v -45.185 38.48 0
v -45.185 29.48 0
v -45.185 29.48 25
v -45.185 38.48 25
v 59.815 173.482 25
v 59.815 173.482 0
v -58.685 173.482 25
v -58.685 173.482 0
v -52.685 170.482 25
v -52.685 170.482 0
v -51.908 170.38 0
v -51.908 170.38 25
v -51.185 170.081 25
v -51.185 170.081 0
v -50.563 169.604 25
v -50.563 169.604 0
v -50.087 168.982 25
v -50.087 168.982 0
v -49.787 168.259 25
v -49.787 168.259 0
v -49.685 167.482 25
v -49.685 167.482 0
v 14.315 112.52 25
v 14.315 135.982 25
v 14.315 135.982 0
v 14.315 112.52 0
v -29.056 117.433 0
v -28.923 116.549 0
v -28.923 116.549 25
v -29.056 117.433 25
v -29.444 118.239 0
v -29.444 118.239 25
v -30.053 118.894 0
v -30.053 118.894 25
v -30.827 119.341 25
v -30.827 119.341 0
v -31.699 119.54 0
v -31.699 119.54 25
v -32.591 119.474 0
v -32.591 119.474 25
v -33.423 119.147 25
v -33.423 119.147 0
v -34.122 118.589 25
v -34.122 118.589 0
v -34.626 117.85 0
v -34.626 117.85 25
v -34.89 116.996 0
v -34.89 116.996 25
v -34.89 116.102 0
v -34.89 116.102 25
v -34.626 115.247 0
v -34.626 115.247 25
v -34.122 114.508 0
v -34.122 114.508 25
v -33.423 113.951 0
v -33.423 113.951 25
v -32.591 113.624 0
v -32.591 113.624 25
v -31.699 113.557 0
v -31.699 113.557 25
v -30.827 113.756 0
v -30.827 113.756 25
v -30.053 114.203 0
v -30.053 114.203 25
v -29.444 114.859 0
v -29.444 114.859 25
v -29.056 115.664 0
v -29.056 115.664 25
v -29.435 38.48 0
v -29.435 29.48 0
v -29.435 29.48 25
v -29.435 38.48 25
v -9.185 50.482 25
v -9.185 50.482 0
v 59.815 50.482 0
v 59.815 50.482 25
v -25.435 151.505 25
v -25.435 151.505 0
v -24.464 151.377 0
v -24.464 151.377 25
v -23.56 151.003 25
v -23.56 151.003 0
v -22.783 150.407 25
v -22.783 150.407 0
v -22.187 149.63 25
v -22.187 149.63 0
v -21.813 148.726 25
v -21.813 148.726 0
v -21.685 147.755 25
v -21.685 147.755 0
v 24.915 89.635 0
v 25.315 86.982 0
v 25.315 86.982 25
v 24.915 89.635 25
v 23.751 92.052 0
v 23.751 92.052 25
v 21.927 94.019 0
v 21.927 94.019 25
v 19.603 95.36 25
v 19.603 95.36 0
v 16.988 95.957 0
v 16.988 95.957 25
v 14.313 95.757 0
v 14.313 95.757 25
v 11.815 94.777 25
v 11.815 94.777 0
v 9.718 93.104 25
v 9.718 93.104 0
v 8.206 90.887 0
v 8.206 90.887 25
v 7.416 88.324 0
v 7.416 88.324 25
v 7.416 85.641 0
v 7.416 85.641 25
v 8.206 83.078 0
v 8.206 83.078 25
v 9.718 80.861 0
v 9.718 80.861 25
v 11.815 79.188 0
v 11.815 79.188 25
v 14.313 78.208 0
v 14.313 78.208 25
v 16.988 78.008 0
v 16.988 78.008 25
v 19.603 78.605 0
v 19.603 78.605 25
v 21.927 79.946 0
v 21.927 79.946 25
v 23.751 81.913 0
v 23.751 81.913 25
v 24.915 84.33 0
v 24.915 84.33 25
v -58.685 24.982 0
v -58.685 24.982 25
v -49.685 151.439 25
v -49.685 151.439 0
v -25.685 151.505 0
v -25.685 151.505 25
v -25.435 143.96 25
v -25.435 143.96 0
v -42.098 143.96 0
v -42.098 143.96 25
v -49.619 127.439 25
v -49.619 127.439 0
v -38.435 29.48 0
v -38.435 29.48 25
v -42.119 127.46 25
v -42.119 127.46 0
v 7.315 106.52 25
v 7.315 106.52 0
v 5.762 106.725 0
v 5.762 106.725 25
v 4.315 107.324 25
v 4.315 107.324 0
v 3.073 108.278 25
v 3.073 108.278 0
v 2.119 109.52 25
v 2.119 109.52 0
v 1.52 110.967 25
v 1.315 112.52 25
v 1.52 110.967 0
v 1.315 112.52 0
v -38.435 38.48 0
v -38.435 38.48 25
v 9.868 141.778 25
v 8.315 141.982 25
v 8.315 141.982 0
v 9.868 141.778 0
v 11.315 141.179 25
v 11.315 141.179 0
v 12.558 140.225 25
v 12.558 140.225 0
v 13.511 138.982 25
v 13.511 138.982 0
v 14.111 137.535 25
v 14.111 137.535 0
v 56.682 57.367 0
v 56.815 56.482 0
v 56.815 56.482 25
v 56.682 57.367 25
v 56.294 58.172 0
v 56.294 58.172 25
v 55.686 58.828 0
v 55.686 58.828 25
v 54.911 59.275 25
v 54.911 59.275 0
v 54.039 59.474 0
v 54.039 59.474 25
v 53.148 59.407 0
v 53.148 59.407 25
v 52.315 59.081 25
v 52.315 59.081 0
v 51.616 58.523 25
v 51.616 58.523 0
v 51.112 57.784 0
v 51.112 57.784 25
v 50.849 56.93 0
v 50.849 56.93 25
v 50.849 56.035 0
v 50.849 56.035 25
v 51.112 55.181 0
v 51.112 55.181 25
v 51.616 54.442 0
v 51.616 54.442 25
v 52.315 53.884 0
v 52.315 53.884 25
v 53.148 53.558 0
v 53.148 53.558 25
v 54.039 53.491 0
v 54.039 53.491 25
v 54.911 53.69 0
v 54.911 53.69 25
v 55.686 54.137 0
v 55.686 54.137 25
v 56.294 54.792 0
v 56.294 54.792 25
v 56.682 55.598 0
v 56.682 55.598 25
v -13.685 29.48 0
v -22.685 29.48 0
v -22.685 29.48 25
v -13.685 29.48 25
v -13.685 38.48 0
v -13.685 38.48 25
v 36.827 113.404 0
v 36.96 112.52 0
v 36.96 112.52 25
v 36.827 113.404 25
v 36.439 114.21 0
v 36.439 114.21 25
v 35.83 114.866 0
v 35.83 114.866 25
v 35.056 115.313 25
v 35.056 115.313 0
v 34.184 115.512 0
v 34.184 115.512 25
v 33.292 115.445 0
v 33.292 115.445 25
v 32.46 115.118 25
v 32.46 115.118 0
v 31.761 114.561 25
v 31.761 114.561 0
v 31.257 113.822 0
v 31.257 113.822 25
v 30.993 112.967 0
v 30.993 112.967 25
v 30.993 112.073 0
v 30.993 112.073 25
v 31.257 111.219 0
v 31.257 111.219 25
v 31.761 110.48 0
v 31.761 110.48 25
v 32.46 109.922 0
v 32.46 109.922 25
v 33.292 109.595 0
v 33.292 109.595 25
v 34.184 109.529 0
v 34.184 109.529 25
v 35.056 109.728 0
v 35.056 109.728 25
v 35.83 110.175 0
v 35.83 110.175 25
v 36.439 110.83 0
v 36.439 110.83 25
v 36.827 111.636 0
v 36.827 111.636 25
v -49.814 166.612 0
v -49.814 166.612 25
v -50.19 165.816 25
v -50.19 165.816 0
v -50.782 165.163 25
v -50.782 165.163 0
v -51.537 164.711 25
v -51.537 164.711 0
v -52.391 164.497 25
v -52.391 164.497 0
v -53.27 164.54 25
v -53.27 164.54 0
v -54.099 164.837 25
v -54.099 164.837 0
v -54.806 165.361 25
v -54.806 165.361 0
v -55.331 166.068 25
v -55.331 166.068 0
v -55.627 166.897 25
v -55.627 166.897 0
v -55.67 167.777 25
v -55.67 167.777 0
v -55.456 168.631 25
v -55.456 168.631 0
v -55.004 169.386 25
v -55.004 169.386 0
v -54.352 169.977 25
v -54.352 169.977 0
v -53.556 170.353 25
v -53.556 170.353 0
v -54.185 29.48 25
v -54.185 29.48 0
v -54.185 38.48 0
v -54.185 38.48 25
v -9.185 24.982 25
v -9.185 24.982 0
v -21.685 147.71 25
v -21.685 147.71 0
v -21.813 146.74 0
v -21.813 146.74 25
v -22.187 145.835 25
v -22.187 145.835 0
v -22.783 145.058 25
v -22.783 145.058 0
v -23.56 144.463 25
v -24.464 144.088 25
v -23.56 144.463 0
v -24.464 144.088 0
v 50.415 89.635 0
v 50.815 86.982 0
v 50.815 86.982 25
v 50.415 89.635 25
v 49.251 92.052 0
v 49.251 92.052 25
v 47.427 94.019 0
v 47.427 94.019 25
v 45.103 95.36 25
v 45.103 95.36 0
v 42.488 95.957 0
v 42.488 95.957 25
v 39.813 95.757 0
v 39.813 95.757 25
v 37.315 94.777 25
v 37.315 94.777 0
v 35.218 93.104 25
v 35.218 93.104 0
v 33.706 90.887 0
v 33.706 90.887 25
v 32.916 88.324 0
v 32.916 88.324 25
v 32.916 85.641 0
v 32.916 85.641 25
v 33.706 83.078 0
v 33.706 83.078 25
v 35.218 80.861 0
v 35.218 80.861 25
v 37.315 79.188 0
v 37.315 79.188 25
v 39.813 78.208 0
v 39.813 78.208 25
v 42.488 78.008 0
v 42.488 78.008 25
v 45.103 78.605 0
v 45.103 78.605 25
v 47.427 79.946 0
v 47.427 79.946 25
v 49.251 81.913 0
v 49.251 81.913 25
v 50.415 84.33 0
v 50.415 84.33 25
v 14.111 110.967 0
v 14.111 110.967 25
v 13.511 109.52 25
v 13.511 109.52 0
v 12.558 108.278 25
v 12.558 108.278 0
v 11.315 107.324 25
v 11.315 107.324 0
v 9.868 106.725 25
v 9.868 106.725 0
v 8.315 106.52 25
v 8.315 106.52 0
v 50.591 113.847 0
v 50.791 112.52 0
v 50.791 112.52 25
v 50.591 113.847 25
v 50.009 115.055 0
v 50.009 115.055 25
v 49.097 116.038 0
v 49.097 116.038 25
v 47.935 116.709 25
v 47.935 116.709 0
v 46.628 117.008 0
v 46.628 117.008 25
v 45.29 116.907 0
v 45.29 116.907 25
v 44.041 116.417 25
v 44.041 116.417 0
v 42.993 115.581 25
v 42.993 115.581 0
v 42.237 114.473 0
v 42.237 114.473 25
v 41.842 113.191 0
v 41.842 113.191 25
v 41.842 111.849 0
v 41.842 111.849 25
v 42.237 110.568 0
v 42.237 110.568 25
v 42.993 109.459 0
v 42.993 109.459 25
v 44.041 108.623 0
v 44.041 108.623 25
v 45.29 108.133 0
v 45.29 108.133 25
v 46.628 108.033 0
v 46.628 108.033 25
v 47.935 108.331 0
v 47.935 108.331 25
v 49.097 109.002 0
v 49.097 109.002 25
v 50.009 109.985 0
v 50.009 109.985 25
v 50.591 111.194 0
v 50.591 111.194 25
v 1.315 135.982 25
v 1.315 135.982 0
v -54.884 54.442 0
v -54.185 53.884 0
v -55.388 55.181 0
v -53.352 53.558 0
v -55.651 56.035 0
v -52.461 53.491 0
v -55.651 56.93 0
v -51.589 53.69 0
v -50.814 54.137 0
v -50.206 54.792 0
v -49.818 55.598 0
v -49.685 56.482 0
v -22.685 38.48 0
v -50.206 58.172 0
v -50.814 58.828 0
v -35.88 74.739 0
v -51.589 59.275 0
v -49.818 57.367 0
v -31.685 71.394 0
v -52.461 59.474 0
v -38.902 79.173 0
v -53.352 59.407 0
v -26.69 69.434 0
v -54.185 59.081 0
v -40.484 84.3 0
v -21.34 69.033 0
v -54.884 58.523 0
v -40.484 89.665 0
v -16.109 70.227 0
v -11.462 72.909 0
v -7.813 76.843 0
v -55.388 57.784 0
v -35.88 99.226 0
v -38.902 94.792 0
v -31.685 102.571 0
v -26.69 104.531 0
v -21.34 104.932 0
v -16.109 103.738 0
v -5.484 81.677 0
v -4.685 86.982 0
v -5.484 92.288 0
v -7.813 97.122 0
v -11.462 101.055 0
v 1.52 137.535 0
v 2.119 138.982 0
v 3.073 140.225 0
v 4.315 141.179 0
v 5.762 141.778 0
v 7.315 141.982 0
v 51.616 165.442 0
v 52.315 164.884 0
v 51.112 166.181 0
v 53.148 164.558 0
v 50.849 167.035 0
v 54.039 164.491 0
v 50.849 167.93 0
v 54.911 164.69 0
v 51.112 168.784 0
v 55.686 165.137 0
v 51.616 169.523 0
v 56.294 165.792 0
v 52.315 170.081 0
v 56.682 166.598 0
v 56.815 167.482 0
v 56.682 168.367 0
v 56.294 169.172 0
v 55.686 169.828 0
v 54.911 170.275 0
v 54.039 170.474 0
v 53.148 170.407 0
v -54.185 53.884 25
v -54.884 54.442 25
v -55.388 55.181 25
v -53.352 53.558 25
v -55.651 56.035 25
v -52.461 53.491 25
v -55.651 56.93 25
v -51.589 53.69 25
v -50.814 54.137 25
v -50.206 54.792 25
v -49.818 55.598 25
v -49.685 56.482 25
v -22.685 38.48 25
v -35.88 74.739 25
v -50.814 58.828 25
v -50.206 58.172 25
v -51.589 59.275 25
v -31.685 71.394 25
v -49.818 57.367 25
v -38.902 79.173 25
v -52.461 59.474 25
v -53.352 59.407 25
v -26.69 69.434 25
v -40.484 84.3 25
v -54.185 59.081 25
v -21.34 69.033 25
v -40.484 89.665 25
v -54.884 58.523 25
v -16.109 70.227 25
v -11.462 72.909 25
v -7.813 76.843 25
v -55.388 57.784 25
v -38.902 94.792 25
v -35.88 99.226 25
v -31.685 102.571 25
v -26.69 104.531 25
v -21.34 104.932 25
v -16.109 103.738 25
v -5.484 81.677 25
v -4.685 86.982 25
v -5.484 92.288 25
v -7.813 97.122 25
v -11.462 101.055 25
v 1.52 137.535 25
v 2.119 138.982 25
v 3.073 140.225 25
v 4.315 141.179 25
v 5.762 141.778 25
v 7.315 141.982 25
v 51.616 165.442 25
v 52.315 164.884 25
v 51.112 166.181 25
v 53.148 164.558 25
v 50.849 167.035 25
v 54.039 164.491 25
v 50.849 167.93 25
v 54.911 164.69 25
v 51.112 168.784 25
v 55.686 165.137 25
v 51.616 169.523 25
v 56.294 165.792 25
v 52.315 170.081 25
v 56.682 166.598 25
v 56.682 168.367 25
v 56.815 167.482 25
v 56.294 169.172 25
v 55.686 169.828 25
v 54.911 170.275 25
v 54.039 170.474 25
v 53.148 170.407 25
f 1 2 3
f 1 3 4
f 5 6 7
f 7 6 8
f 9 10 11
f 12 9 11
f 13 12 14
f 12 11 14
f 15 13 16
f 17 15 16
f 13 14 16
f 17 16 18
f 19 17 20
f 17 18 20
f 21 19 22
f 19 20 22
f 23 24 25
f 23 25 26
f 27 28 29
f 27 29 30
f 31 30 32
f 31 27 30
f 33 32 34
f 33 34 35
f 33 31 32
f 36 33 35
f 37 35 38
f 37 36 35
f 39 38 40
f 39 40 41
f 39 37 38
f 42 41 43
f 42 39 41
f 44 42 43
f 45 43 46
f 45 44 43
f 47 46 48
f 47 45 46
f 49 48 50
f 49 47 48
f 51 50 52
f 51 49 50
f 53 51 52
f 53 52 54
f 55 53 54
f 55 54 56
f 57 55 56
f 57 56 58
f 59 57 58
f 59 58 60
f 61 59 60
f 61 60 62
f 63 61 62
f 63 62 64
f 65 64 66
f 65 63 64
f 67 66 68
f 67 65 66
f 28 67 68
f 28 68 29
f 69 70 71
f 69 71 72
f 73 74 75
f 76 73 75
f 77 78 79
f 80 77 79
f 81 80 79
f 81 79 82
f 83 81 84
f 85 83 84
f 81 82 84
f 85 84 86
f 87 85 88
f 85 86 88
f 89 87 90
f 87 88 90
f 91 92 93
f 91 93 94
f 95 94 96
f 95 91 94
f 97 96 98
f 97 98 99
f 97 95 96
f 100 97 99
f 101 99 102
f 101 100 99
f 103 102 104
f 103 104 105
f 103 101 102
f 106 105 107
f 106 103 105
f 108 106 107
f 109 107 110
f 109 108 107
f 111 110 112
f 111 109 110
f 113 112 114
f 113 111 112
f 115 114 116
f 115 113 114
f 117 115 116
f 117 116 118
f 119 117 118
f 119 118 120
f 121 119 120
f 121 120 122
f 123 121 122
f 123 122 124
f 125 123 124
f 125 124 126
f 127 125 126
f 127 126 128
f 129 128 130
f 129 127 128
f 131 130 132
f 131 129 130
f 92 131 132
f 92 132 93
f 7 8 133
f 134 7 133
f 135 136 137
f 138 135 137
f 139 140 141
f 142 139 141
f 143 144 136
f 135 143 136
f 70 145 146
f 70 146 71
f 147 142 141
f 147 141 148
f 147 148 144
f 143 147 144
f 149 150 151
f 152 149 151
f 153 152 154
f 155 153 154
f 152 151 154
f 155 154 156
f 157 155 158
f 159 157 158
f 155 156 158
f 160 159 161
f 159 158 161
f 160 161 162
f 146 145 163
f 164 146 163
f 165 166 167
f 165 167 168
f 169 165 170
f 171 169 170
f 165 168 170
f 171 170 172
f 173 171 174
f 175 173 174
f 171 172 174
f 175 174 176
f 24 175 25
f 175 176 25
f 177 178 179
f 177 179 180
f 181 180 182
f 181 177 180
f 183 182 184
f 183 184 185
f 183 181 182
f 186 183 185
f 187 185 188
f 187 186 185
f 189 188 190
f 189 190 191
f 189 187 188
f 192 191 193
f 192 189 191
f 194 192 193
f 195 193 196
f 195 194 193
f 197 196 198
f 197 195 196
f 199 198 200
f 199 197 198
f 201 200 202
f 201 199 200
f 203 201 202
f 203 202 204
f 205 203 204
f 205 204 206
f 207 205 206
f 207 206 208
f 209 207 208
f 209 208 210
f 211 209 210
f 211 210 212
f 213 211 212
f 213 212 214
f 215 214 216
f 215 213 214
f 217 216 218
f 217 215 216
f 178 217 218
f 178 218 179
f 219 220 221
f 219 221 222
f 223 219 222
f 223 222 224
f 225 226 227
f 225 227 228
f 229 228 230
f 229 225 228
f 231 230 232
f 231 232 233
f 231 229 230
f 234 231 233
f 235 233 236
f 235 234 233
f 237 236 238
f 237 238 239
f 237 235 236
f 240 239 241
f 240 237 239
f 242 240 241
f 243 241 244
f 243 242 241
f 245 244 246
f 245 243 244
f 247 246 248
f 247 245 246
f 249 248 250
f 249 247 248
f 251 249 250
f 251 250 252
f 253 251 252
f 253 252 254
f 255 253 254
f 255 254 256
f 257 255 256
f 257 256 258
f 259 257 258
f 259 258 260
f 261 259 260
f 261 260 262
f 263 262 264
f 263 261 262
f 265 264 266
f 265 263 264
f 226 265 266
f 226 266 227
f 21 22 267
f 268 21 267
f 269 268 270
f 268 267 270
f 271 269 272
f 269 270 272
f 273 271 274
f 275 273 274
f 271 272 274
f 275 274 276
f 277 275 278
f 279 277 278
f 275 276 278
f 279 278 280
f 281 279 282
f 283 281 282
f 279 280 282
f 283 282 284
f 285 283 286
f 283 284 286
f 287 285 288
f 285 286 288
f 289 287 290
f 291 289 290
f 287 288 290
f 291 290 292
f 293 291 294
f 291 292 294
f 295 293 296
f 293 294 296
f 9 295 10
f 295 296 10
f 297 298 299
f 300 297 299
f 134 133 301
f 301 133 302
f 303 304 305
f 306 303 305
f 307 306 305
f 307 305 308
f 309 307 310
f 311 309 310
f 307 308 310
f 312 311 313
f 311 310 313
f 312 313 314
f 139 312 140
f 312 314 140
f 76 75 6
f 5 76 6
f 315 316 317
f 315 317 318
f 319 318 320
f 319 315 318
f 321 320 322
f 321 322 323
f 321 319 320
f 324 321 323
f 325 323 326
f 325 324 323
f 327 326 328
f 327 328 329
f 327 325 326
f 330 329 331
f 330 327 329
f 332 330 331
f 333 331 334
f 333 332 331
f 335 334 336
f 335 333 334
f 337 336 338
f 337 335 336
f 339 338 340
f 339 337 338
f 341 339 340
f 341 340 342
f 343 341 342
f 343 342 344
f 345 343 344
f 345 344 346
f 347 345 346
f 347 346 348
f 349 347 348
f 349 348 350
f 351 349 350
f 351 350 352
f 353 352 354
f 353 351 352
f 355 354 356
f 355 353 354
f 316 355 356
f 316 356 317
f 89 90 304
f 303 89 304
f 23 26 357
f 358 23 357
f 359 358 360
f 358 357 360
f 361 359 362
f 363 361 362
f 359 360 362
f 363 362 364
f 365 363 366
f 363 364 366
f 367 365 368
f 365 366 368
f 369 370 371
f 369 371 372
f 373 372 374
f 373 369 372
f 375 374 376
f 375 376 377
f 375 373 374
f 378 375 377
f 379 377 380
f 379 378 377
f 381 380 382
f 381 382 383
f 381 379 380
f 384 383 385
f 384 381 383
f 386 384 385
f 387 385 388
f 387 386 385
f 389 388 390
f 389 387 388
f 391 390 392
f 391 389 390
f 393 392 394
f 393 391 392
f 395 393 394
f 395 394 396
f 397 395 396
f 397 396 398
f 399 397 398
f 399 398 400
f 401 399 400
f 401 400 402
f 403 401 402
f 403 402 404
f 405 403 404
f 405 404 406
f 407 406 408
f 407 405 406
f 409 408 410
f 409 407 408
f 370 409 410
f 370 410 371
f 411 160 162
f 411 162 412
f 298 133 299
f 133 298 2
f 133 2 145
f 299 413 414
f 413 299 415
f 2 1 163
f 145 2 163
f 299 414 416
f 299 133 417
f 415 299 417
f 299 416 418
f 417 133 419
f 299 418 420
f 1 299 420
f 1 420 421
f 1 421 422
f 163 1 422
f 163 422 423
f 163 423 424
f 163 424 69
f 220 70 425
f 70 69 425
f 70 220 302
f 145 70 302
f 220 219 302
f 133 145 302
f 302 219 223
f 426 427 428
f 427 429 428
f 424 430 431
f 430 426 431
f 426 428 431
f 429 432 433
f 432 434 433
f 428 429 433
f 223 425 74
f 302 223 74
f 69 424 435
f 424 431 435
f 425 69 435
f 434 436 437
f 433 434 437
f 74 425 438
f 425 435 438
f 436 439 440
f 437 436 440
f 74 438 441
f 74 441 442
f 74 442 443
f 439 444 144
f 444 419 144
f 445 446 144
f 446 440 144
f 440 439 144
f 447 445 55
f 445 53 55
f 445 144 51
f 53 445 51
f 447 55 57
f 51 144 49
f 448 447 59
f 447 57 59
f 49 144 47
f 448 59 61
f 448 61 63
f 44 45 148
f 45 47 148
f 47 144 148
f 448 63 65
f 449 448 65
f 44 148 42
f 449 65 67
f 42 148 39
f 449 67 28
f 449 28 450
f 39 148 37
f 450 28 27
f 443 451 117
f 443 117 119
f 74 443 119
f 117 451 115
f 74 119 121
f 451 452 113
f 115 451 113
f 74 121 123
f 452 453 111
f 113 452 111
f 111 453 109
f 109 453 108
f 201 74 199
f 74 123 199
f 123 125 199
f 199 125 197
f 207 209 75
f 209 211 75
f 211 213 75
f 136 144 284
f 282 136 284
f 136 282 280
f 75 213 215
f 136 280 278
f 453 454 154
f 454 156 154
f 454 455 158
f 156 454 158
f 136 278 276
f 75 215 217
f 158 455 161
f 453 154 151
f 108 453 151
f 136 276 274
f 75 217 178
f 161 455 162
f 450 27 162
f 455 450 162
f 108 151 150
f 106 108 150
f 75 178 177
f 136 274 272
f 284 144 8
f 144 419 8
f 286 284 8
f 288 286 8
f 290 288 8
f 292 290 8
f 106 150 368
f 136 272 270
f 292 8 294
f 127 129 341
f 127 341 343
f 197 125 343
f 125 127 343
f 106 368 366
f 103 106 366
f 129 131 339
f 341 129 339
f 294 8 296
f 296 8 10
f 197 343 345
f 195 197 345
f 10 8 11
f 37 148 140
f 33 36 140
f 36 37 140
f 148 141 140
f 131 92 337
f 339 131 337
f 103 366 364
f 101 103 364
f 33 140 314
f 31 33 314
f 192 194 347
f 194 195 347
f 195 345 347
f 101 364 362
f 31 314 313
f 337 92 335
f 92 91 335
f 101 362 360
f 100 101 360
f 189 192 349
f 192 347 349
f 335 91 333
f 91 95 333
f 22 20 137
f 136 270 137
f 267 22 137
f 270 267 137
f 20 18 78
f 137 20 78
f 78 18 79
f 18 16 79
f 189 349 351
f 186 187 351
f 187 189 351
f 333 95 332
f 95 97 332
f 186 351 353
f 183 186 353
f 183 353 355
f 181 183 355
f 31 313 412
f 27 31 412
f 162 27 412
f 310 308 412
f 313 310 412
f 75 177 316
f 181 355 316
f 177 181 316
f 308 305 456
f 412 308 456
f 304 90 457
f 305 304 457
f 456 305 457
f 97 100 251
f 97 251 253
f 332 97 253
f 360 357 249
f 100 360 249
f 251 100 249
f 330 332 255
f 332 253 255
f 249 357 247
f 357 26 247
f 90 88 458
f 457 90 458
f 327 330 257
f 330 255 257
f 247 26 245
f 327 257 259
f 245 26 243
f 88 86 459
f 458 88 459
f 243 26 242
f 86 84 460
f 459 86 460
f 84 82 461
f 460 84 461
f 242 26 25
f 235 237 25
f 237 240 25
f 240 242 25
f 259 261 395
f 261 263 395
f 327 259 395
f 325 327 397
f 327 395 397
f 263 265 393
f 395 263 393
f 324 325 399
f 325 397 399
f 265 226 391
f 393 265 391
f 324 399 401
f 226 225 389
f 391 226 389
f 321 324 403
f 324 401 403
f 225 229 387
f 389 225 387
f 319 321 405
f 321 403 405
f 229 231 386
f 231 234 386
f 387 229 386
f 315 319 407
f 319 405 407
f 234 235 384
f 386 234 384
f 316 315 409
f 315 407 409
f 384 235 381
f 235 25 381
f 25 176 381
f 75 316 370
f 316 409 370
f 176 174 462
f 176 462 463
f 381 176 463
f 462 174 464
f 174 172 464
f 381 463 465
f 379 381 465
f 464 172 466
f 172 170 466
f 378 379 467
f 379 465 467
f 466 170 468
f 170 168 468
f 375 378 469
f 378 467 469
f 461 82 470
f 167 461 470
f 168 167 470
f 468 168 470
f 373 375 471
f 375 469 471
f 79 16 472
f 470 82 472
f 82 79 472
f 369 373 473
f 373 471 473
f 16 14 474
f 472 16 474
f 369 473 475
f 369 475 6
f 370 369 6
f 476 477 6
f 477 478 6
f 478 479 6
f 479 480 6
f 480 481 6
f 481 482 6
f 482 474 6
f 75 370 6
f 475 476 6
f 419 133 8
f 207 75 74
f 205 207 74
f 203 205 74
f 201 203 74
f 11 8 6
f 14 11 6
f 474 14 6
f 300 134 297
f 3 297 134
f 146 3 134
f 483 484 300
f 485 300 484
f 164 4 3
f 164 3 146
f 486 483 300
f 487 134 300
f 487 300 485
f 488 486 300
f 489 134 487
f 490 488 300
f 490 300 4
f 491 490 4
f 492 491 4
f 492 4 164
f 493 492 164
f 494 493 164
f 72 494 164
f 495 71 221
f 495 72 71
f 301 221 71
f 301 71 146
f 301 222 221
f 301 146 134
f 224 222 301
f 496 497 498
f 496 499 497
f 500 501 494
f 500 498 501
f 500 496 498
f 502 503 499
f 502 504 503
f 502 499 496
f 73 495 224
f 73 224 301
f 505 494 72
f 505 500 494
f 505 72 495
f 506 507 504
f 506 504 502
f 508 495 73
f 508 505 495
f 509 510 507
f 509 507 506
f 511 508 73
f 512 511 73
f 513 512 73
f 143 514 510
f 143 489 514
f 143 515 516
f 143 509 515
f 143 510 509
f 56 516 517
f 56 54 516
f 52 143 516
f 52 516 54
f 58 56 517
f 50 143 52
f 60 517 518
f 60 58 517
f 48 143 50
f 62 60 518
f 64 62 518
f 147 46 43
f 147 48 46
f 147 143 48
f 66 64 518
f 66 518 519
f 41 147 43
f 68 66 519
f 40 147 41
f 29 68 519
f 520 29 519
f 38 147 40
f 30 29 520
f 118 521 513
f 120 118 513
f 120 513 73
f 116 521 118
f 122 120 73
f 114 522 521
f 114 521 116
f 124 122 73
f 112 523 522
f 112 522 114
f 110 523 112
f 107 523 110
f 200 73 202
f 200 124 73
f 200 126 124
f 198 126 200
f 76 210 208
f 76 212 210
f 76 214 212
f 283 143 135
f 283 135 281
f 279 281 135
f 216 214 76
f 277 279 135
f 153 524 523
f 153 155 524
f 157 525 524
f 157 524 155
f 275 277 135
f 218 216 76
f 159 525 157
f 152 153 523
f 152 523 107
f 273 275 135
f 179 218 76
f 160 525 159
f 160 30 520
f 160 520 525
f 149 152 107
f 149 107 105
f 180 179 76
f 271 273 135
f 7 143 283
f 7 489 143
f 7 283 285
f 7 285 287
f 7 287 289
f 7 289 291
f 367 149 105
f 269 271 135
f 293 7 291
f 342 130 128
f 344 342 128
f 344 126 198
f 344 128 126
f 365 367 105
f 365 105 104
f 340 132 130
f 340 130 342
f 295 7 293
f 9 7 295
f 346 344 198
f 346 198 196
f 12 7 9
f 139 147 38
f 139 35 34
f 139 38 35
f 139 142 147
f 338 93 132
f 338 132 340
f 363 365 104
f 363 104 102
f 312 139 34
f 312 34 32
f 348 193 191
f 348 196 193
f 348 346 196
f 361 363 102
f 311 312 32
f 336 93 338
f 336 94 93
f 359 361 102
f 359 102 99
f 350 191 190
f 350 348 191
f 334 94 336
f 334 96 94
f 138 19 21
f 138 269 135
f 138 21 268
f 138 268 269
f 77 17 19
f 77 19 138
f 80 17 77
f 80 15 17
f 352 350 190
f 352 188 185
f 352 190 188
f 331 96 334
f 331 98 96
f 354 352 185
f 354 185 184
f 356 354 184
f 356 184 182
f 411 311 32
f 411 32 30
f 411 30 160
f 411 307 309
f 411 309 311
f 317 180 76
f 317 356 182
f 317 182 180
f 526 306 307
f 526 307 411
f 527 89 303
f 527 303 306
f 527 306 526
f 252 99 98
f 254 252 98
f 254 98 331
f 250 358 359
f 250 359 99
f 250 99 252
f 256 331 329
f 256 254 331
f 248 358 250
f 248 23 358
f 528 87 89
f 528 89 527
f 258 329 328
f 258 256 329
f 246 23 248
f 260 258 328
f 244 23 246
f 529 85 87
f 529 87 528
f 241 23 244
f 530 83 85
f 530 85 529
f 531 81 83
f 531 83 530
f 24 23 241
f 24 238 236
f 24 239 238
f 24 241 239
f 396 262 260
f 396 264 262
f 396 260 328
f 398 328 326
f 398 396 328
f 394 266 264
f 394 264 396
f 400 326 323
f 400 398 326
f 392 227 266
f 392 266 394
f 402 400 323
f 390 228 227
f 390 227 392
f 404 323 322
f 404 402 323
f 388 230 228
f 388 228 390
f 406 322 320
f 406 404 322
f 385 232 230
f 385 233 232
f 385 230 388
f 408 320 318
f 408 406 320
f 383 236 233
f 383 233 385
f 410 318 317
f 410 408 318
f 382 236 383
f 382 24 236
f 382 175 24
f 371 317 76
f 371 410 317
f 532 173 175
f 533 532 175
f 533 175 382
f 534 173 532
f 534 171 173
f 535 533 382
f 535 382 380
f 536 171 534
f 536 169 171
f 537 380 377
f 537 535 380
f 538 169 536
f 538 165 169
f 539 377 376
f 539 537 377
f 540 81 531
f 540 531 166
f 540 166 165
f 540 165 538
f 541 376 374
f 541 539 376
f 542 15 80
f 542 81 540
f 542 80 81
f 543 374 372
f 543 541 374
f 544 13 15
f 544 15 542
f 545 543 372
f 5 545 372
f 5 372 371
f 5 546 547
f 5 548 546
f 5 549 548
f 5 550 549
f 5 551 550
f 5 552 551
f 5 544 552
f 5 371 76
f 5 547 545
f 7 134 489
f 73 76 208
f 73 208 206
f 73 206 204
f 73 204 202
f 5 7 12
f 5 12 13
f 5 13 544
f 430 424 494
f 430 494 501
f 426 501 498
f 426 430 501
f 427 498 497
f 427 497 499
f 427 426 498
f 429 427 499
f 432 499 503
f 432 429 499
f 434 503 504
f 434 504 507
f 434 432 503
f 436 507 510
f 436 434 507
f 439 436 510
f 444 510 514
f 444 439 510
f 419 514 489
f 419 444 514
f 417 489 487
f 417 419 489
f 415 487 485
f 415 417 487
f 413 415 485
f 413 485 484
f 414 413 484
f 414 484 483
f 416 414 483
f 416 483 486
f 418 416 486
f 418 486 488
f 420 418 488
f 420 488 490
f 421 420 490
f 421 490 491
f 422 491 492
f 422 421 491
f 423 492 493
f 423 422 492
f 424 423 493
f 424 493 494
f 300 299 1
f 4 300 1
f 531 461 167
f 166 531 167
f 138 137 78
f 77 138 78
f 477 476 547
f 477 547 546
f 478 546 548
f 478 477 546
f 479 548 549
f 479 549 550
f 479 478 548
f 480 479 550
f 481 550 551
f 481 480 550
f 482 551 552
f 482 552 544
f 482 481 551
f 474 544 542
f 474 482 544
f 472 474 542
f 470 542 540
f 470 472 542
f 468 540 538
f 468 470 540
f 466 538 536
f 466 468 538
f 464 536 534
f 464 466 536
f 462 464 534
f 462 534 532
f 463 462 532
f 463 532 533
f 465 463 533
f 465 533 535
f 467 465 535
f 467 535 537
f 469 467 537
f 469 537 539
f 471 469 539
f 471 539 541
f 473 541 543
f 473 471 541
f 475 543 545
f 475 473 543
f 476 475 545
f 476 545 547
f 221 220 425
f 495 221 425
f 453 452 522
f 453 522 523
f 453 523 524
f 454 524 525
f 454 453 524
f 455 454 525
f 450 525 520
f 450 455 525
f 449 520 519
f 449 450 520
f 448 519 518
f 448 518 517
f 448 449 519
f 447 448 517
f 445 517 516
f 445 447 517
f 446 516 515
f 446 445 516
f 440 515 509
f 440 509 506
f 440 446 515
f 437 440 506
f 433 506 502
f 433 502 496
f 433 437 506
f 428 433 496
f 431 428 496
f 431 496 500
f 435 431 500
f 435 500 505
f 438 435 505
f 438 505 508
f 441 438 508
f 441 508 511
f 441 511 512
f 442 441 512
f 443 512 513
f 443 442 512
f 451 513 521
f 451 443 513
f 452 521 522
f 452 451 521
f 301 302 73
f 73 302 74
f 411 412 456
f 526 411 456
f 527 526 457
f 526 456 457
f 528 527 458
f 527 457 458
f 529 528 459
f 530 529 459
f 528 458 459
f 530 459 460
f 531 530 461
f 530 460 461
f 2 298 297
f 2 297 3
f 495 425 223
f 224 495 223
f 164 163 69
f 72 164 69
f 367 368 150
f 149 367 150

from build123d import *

# Parameters (mm, degrees)
F0_W     = 9
F0_H     = 9
F0_R     = 3
F0_R_2   = 18
F0_R_3   = 9
F0_R_4   = 4.5
F1_DEPTH = 25


with BuildPart() as f1:
    # F0 (on Top) → F1 (new body)
    with BuildSketch(Plane.XY):
        Polygon((-52.684808, 173.482456), (-58.684808, 173.482456), (-58.684808, 24.982456), (-9.184808, 24.982456), (-9.184808, 50.482456), (59.815192, 50.482456), (59.815192, 86.982456), (59.815192, 173.482456), (7.315192, 173.482456), align=None)
        with Locations((-49.684808, 33.980483)):
            Rectangle(F0_W, F0_H, mode=Mode.SUBTRACT)
        with Locations((-33.934808, 33.980483)):
            Rectangle(F0_W, F0_H, mode=Mode.SUBTRACT)
        with Locations((-52.684808, 56.482456)):
            Circle(F0_R, mode=Mode.SUBTRACT)
        with Locations((-18.184808, 33.980483)):
            Rectangle(F0_W, F0_H, mode=Mode.SUBTRACT)
        with Locations((-22.684808, 86.982456)):
            Circle(F0_R_2, mode=Mode.SUBTRACT)
        with Locations((53.815192, 56.482456)):
            Circle(F0_R, mode=Mode.SUBTRACT)
        with Locations((16.315192, 86.982456)):
            Circle(F0_R_3, mode=Mode.SUBTRACT)
        with Locations((41.815192, 86.982456)):
            Circle(F0_R_3, mode=Mode.SUBTRACT)
        with Locations((-31.923011, 116.548747)):
            Circle(F0_R, mode=Mode.SUBTRACT)
        with BuildLine():
            Line((-49.618921, 127.439418), (-49.684808, 151.439328))
            Line((-49.684808, 151.439328), (-25.684899, 151.505215))
            Line((-25.684899, 151.505215), (-25.434899, 151.505215))
            ThreePointArc((-25.434899, 151.505215), (-22.783248, 150.406866), (-21.684899, 147.755215))
            Line((-21.684899, 147.755215), (-21.684899, 147.710127))
            ThreePointArc((-21.684899, 147.710127), (-22.783248, 145.058476), (-25.434899, 143.960127))
            Line((-25.434899, 143.960127), (-25.684899, 143.960127))
            Line((-25.684899, 143.960127), (-42.098359, 143.960127))
            Line((-42.098359, 143.960127), (-42.118949, 127.460008))
            Line((-42.118949, 127.460008), (-49.618921, 127.439418))
        make_face(mode=Mode.SUBTRACT)
        with BuildLine():
            ThreePointArc((-49.684808, 167.482456), (-54.806129, 165.361135), (-52.684808, 170.482456))
            ThreePointArc((-52.684808, 170.482456), (-50.563488, 169.603776), (-49.684808, 167.482456))
        make_face(mode=Mode.SUBTRACT)
        with BuildLine():
            Line((1.315192, 114.520175), (1.315192, 133.982456))
            Line((1.315192, 133.982456), (1.315192, 135.982456))
            ThreePointArc((1.315192, 135.982456), (3.072551, 140.225096), (7.315192, 141.982456))
            Line((7.315192, 141.982456), (8.315192, 141.982456))
            ThreePointArc((8.315192, 141.982456), (12.557832, 140.225096), (14.315192, 135.982456))
            Line((14.315192, 135.982456), (14.315192, 132.982456))
            Line((14.315192, 132.982456), (14.315192, 112.520175))
            ThreePointArc((14.315192, 112.520175), (12.557832, 108.277534), (8.315192, 106.520175))
            Line((8.315192, 106.520175), (7.315192, 106.520175))
            ThreePointArc((7.315192, 106.520175), (3.072551, 108.277534), (1.315192, 112.520175))
            Line((1.315192, 112.520175), (1.315192, 114.520175))
        make_face(mode=Mode.SUBTRACT)
        with Locations((33.959863, 112.520175)):
            Circle(F0_R, mode=Mode.SUBTRACT)
        with Locations((46.291271, 112.520175)):
            Circle(F0_R_4, mode=Mode.SUBTRACT)
        with Locations((53.815192, 167.482456)):
            Circle(F0_R, mode=Mode.SUBTRACT)
    extrude(amount=F1_DEPTH)


solid = f1.part
